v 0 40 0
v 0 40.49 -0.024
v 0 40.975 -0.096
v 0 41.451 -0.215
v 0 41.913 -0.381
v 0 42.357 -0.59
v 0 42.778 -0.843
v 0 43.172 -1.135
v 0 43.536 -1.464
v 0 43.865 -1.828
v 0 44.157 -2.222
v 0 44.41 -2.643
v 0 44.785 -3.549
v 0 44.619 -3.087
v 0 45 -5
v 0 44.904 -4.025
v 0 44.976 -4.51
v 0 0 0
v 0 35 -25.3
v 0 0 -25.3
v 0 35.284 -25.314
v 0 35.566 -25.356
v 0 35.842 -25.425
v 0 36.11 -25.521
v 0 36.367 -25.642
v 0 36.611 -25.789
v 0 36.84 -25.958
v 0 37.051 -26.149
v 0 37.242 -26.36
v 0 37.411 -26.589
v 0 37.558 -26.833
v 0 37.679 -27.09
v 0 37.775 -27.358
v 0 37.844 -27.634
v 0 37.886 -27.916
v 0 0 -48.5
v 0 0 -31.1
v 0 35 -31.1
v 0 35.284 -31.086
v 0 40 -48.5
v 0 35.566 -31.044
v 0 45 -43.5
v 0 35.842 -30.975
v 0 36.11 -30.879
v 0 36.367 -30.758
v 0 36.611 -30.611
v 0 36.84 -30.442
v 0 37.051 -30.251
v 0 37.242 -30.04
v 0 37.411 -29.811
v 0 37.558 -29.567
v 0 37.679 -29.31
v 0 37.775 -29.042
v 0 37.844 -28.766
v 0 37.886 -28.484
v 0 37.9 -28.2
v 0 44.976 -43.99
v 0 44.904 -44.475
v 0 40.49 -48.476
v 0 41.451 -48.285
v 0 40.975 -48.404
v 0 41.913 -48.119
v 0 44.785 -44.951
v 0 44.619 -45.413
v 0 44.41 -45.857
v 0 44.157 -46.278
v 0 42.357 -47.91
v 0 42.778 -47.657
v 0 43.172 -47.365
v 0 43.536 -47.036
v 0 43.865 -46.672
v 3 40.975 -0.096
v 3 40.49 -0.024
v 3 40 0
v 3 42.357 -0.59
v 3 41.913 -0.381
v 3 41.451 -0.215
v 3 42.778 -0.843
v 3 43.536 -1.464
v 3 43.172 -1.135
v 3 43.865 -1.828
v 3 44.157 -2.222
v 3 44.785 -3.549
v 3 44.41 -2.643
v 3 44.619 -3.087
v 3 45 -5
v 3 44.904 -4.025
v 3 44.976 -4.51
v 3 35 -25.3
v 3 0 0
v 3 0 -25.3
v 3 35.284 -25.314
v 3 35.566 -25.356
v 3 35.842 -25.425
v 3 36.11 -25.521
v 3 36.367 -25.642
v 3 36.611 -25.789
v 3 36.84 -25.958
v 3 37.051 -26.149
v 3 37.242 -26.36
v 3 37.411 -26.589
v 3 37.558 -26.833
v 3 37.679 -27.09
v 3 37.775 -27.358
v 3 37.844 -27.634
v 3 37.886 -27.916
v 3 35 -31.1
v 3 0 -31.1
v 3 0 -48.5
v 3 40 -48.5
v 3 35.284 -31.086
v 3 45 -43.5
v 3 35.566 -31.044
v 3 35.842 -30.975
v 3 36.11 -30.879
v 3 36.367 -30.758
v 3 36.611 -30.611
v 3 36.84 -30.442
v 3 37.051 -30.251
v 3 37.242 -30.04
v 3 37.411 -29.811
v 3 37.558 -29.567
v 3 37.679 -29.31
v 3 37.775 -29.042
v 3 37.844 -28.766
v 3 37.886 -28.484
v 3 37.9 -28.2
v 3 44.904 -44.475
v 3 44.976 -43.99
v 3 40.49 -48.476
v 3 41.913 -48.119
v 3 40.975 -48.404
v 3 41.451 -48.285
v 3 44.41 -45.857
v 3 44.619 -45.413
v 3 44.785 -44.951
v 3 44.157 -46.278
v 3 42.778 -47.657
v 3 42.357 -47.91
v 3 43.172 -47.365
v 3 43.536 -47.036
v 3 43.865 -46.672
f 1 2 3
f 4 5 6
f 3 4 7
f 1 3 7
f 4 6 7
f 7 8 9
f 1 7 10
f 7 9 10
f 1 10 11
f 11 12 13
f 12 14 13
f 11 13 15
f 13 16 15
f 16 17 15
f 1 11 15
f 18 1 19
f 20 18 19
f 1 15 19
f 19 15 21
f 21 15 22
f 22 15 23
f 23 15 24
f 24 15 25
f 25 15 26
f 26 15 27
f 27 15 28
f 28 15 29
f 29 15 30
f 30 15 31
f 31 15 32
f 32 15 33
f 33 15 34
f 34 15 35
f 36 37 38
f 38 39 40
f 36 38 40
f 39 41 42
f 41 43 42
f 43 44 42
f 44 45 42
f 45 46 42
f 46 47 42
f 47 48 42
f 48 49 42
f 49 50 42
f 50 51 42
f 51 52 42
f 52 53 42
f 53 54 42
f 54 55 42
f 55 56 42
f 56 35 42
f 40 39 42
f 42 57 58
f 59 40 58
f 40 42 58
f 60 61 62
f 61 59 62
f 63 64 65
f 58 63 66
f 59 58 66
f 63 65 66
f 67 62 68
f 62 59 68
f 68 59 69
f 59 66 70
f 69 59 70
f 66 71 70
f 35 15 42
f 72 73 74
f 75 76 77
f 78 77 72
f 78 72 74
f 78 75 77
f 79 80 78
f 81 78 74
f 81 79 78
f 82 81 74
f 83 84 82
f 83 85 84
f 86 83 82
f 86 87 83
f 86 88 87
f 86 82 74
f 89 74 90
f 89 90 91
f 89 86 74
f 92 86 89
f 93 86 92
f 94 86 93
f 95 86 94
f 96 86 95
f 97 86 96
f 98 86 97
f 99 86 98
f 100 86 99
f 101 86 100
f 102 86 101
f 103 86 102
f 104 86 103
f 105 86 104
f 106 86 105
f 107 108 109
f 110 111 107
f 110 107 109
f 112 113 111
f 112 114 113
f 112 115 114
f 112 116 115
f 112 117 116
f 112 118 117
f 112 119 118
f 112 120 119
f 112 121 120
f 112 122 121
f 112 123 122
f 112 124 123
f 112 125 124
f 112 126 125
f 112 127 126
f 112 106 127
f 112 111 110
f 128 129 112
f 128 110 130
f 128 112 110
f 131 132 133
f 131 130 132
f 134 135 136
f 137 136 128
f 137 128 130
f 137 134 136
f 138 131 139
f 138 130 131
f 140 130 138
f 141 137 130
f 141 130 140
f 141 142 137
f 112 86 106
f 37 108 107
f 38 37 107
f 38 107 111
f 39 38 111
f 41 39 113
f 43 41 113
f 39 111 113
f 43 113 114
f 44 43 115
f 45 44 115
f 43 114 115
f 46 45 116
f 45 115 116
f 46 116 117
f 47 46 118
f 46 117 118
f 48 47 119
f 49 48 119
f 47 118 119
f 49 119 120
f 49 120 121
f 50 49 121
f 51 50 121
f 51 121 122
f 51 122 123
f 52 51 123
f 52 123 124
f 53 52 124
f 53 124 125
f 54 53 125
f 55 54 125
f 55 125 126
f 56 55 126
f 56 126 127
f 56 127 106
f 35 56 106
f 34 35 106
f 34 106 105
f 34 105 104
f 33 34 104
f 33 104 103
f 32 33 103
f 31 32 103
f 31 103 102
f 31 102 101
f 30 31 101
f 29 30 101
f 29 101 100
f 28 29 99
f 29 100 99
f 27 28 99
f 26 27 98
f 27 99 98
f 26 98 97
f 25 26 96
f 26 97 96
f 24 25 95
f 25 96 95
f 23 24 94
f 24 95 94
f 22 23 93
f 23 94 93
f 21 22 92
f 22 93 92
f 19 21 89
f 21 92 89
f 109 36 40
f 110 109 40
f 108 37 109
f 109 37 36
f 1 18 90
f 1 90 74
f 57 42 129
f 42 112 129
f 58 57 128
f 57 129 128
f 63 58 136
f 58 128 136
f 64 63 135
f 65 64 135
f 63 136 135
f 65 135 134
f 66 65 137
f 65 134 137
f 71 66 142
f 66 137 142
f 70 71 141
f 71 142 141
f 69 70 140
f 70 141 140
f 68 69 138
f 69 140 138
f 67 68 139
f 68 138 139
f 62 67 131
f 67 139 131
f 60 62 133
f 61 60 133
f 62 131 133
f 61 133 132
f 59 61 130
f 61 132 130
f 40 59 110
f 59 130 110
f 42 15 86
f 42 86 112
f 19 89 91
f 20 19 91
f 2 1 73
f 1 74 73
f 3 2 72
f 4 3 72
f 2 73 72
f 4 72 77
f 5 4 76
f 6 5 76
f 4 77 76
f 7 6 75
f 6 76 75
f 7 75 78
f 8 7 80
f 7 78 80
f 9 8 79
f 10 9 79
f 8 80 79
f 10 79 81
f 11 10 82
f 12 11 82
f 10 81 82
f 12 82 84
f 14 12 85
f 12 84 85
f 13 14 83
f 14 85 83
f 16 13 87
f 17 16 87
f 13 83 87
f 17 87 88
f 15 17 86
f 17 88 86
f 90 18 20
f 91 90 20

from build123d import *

# Parameters (mm, degrees)
SKETCH1_W           = 48.5
SKETCH1_H           = 45
BOSS_EXTRUDE1_DEPTH = 3
CUT_EXTRUDE1_DEPTH  = 4
FILLET1_R           = 5


with BuildPart() as part:
    # Sketch1 → Boss-Extrude1 (new body)
    with BuildSketch(Plane(origin=(0, 0, 0), x_dir=(0, 0, -1), z_dir=(1, 0, 0))):
        with Locations((24.25, 22.5)):
            Rectangle(SKETCH1_W, SKETCH1_H)
    extrude(amount=BOSS_EXTRUDE1_DEPTH)

    # Sketch2 → Cut-Extrude1 (cut, through all)
    with BuildSketch(Plane(origin=(3, 0, 0), x_dir=(0, 0, -1), z_dir=(1, 0, 0))):
        with BuildLine():
            Line((25.3, 35), (25.3, 0))
            Line((25.3, 0), (31.1, 0))
            Line((31.1, 0), (31.1, 35))
            ThreePointArc((31.1, 35), (28.2, 37.9), (25.3, 35))
        make_face()
    extrude(amount=-CUT_EXTRUDE1_DEPTH, mode=Mode.SUBTRACT)

    # Fillet1
    fillet1_edges = [part.edges().sort_by_distance(p)[0] for p in [
        (1.5, 45, 0),
        (1.5, 45, -48.5),
    ]]
    fillet(fillet1_edges, radius=FILLET1_R)


solid = part.part
